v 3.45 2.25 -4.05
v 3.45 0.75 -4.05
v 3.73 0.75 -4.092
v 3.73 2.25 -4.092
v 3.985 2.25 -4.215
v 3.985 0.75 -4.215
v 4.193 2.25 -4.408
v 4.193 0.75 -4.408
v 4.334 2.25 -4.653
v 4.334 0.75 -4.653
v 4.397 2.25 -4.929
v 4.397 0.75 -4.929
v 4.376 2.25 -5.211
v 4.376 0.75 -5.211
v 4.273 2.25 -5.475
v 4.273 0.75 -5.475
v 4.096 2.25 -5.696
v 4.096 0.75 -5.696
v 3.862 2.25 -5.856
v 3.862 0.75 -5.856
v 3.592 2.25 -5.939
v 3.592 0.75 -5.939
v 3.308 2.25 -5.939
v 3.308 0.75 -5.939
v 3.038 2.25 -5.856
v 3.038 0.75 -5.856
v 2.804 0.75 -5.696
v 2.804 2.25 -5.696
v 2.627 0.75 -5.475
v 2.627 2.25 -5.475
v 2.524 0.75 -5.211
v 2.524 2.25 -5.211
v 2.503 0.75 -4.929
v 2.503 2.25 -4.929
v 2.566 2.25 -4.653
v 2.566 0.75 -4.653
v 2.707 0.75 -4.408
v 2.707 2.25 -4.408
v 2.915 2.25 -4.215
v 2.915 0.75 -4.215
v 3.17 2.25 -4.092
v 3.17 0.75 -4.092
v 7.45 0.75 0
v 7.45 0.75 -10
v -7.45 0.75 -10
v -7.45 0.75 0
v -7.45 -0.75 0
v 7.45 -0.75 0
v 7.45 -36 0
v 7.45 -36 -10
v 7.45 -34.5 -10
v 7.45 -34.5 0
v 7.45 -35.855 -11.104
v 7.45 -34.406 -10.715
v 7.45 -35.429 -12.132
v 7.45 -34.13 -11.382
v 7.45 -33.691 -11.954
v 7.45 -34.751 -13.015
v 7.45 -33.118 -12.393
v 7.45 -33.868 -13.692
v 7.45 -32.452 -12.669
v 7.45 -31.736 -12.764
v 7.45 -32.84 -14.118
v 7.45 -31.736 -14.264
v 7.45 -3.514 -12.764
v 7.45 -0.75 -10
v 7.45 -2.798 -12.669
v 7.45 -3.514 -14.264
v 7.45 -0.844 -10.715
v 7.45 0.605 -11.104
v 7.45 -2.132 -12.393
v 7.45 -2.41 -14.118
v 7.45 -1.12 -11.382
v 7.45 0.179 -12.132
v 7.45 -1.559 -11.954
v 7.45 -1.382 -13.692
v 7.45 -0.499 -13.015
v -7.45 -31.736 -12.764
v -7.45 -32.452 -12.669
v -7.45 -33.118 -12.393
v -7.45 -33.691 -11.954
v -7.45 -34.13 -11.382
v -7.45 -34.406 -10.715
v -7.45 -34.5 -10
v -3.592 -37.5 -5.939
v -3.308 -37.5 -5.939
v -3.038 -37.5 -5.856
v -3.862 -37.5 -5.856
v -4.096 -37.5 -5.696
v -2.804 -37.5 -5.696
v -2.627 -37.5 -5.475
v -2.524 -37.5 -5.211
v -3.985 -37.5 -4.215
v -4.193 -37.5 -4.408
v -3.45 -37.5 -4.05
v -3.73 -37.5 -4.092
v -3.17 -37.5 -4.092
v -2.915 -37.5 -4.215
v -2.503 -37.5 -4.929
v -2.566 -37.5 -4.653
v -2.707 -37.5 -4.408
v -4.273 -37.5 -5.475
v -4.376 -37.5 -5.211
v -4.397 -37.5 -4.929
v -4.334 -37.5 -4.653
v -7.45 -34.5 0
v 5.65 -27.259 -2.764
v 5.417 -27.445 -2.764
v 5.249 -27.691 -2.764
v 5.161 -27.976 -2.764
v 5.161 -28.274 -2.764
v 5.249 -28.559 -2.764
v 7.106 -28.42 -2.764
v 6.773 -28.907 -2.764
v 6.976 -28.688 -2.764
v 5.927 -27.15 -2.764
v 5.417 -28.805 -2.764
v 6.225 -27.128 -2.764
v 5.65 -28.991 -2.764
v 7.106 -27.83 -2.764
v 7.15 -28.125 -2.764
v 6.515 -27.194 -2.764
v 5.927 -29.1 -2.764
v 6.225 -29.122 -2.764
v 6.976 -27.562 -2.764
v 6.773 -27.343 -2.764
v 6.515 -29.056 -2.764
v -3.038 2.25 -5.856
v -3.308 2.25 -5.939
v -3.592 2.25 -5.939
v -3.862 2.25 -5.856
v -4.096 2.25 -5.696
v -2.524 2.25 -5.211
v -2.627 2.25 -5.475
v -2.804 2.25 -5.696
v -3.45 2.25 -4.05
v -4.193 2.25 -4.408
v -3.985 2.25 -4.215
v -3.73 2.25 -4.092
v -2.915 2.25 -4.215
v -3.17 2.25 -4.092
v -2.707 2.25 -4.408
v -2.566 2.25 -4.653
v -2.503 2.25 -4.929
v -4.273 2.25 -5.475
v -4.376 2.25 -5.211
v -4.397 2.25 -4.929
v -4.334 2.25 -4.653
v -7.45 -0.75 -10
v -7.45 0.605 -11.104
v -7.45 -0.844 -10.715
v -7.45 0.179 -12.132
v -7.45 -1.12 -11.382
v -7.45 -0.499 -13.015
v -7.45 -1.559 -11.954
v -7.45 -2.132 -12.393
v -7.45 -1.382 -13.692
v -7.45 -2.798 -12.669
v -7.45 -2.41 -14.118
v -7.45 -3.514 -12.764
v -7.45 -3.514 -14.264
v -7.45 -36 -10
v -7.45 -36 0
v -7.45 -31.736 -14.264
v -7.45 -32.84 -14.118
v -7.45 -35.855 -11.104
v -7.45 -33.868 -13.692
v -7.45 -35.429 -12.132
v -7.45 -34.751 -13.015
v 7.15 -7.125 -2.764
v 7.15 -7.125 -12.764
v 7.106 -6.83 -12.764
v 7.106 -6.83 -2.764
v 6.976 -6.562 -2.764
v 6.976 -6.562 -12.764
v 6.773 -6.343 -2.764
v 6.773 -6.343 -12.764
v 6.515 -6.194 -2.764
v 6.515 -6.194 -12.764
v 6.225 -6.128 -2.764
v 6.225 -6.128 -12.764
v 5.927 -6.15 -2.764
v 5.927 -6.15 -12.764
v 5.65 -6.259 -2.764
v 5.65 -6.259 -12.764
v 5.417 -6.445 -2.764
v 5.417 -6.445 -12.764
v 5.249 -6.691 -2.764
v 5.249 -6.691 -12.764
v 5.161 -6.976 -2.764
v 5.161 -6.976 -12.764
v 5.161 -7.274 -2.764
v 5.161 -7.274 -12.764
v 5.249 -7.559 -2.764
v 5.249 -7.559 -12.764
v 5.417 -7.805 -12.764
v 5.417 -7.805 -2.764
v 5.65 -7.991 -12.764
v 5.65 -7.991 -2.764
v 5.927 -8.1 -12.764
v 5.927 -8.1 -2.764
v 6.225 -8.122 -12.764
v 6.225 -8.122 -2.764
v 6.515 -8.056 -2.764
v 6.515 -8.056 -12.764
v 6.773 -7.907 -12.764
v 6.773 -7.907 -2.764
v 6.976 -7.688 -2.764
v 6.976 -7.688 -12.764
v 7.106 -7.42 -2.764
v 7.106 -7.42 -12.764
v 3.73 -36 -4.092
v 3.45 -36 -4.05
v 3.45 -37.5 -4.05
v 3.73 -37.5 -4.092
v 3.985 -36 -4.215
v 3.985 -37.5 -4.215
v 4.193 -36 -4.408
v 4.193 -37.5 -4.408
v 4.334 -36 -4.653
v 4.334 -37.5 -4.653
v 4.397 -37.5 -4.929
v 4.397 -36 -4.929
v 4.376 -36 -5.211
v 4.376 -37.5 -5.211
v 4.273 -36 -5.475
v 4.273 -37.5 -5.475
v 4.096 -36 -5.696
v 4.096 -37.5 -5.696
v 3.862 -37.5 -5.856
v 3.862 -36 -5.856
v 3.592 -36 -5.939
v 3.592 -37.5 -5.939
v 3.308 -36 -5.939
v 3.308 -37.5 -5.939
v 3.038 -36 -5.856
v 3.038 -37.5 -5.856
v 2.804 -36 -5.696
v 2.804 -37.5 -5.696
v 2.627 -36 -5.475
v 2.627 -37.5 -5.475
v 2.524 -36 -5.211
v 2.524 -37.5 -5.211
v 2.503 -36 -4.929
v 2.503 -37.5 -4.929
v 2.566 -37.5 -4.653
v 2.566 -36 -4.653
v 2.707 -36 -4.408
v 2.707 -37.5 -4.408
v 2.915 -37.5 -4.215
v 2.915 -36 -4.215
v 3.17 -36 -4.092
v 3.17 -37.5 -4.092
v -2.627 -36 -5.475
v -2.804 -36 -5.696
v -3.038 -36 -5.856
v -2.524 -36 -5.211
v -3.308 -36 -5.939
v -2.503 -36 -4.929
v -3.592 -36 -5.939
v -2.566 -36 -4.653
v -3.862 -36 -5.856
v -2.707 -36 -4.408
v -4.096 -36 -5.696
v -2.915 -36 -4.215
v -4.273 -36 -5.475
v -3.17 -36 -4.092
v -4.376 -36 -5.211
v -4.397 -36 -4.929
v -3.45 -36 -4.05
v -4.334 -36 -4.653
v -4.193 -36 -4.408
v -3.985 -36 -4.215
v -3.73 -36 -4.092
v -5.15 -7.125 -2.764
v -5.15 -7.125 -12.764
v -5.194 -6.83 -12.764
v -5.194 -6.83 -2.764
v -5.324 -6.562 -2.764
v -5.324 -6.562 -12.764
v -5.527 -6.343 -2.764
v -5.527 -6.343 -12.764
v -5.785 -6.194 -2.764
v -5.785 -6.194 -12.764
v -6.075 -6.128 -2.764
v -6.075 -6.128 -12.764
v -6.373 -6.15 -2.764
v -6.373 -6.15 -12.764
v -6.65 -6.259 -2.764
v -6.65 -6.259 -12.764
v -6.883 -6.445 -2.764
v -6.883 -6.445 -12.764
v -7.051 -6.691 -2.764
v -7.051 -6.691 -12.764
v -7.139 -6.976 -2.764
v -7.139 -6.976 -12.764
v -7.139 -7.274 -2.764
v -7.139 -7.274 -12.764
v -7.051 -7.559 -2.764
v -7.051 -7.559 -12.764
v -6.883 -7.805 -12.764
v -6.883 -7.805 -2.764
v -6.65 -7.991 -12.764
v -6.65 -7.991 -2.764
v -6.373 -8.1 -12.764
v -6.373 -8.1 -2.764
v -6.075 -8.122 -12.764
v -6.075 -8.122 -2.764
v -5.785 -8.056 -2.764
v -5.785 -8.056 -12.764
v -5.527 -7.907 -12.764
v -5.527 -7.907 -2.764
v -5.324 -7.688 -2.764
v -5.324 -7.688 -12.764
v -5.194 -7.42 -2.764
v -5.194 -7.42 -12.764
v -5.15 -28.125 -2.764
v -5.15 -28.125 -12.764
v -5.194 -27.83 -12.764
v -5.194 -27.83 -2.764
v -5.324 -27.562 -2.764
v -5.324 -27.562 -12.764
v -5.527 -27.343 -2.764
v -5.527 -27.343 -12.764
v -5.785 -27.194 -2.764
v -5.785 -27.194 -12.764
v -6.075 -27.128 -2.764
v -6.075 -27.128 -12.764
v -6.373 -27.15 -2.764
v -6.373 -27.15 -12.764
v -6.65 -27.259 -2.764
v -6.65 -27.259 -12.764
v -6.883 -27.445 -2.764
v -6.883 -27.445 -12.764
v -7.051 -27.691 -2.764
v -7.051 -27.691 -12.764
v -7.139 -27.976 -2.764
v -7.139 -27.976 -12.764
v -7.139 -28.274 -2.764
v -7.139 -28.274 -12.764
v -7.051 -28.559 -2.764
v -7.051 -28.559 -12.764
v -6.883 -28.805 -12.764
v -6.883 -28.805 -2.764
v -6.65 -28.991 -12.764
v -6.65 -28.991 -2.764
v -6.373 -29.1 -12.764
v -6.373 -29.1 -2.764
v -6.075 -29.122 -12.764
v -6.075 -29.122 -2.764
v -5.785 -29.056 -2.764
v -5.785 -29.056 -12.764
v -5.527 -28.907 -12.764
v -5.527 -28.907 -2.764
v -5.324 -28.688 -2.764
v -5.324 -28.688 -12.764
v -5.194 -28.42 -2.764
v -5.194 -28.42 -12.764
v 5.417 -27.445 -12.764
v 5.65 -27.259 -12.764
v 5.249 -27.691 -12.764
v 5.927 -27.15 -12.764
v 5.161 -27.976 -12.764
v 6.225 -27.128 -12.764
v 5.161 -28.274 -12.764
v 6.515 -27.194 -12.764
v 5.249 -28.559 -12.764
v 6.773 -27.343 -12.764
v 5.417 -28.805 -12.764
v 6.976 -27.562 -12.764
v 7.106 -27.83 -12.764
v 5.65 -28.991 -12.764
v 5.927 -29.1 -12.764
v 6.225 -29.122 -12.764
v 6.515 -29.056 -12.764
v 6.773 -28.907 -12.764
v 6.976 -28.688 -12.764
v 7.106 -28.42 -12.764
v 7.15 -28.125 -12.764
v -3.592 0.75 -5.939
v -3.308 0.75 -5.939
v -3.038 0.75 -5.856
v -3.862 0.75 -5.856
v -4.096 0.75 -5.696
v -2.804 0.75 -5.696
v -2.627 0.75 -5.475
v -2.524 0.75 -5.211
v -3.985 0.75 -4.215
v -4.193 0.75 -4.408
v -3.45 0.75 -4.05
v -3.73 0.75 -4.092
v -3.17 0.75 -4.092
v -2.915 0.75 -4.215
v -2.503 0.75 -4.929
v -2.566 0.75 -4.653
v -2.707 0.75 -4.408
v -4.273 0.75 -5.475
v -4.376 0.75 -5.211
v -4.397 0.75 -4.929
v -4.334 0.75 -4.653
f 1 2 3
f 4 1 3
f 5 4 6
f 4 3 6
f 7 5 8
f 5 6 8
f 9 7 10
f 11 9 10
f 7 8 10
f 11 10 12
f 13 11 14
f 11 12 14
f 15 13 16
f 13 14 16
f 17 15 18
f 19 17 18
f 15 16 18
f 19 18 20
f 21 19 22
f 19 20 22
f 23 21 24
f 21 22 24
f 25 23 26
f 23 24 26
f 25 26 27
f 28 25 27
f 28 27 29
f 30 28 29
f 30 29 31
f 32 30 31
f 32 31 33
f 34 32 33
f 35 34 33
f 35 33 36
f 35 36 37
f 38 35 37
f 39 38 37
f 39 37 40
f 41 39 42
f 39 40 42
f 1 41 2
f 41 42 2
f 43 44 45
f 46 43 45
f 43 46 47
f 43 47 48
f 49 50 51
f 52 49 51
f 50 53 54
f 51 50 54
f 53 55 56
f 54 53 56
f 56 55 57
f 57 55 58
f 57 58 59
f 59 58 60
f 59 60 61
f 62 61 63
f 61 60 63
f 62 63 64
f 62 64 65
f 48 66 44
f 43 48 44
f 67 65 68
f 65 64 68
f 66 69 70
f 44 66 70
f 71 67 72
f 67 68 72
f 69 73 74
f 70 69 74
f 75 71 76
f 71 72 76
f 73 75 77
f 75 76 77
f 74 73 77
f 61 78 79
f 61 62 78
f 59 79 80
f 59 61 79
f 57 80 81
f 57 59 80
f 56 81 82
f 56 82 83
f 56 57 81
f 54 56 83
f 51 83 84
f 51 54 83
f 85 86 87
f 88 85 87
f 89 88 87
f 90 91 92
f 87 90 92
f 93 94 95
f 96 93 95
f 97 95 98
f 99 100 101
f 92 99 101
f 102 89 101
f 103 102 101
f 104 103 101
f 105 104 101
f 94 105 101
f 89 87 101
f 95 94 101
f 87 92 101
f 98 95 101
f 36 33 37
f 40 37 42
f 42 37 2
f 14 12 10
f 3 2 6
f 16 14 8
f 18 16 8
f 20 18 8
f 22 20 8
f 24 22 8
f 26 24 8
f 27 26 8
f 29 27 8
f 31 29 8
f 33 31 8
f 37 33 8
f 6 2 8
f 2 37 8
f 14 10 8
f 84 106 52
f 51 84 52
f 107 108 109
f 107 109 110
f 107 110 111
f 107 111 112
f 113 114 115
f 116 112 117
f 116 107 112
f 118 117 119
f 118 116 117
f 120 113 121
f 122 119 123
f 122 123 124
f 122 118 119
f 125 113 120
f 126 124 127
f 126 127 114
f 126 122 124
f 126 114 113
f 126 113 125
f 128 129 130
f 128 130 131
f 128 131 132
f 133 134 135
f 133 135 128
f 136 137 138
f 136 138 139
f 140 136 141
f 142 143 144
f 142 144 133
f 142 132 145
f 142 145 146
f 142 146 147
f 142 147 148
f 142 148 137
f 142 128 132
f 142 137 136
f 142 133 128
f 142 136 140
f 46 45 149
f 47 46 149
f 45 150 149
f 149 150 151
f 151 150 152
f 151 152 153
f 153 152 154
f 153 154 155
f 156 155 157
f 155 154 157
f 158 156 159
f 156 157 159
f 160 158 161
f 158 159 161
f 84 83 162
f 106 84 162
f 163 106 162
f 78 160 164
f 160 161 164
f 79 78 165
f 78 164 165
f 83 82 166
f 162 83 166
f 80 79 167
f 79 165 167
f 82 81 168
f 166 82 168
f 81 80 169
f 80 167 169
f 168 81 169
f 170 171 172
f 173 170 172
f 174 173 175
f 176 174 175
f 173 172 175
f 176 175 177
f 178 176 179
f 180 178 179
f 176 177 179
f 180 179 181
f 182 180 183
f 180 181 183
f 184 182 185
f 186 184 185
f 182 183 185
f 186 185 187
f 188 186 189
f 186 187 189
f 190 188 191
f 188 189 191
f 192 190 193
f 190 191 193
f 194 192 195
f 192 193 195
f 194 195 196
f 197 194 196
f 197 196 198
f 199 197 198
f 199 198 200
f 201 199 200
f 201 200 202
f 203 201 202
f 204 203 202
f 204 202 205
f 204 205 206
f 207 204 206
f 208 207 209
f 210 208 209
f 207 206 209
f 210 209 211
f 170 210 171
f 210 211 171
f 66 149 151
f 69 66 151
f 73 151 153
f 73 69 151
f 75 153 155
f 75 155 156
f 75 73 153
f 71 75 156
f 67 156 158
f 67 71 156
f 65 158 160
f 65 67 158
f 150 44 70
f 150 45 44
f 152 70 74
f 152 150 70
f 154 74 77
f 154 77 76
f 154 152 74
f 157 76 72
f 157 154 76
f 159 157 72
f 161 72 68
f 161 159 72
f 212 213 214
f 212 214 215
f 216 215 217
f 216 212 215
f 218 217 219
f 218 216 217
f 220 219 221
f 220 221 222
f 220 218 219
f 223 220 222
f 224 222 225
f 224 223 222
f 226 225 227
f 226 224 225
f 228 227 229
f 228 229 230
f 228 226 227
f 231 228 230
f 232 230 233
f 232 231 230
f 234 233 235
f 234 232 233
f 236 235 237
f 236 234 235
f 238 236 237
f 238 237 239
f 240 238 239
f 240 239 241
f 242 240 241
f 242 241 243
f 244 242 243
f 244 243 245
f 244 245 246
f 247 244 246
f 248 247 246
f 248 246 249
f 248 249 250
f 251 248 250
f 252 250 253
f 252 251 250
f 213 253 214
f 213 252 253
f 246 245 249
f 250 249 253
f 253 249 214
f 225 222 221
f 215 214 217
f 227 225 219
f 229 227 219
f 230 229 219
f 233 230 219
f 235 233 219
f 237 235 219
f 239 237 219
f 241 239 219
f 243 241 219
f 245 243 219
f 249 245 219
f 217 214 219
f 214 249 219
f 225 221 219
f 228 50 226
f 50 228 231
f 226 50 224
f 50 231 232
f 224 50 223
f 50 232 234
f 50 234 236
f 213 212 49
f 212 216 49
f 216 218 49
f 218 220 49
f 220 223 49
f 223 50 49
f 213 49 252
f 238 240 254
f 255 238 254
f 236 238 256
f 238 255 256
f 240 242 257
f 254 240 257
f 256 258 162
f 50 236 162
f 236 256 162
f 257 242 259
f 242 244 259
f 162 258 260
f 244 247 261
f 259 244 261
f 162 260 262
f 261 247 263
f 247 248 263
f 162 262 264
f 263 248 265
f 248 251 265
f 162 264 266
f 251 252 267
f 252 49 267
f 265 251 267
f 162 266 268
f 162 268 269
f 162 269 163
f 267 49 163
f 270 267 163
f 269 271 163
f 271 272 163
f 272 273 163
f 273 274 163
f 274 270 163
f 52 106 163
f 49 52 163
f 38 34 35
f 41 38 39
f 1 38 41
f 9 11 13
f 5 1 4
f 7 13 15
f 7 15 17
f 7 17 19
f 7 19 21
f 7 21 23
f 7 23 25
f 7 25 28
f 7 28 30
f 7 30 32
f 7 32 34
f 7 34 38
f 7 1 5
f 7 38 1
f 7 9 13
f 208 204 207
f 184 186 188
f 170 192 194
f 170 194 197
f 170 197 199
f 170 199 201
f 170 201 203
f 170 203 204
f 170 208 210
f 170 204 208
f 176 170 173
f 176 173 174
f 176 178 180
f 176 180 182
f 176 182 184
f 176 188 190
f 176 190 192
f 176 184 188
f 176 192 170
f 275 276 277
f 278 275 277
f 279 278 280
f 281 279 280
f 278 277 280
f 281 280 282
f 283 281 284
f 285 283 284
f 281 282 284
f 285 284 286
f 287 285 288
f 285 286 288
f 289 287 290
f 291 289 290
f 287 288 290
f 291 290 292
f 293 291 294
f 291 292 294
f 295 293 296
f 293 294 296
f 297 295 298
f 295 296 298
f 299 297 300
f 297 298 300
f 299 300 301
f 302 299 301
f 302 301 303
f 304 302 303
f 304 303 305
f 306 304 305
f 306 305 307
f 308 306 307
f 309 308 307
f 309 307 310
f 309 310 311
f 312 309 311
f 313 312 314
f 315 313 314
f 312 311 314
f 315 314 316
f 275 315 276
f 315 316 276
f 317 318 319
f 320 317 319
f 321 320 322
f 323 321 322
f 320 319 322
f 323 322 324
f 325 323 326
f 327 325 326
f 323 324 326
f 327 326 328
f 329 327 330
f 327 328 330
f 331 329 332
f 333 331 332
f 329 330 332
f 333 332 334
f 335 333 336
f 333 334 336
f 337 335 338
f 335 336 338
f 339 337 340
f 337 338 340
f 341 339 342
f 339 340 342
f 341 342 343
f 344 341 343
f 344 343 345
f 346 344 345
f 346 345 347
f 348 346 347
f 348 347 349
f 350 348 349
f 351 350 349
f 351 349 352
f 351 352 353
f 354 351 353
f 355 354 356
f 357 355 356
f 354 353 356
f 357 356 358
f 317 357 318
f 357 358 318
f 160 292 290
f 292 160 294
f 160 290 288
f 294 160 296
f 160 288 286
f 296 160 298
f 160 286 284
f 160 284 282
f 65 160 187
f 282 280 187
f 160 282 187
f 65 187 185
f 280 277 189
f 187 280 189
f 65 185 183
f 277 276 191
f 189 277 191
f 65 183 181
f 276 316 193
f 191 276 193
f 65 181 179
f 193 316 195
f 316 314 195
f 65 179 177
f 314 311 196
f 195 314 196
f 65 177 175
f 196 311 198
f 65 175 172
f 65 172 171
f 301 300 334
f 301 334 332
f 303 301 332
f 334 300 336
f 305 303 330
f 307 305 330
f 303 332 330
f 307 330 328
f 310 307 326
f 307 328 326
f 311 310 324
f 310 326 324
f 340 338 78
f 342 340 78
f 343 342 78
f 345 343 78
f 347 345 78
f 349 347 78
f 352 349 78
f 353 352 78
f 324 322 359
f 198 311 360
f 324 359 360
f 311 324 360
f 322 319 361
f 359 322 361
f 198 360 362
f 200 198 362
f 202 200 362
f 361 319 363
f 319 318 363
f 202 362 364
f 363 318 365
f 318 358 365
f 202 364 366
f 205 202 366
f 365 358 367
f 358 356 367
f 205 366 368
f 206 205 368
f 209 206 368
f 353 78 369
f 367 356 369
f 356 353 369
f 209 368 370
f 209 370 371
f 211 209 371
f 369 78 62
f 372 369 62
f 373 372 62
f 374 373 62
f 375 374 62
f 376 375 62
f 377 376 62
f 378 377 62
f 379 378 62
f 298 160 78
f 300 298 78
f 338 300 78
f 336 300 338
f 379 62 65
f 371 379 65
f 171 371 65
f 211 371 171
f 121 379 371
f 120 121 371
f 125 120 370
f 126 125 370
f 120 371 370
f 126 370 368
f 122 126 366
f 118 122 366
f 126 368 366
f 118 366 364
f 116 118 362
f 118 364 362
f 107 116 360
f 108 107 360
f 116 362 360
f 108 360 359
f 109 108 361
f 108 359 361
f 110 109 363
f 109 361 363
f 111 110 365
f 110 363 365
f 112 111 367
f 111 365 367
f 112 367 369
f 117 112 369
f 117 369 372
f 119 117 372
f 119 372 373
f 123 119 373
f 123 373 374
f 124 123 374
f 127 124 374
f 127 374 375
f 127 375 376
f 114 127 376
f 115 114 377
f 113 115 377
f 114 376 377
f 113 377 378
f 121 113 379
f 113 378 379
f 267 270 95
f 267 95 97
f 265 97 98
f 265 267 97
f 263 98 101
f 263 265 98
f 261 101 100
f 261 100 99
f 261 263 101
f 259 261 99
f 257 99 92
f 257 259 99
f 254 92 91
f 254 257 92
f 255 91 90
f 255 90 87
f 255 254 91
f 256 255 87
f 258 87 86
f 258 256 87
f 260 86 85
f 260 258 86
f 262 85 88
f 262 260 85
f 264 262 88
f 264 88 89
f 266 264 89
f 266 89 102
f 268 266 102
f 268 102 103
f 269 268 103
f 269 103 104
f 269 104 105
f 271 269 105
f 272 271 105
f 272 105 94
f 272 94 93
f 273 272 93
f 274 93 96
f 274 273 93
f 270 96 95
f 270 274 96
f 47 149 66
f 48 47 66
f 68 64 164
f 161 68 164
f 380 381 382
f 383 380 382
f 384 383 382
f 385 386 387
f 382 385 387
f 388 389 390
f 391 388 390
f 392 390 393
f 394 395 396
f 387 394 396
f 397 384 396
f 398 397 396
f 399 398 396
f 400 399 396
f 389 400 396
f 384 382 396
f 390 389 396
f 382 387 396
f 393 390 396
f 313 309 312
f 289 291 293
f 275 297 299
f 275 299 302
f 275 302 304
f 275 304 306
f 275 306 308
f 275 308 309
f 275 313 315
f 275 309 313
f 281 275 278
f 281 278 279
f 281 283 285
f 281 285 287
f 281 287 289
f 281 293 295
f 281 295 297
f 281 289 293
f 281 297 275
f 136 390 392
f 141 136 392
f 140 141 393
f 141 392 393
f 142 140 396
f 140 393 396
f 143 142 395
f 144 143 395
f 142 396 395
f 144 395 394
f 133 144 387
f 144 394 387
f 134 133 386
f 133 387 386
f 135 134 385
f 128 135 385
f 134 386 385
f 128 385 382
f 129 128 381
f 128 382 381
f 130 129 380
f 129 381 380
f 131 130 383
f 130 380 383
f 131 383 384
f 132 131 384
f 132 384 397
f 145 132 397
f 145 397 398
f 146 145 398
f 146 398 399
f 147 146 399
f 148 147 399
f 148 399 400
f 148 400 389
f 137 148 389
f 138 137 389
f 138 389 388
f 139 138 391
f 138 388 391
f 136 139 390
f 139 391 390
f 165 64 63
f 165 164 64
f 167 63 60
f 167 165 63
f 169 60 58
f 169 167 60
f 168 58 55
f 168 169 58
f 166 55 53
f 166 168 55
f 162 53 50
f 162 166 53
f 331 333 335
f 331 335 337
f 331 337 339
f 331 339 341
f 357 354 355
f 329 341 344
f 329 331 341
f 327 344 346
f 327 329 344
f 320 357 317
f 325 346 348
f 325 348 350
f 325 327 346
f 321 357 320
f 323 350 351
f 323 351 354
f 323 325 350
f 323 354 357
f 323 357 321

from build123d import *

# Parameters (mm, degrees)
SKETCH_1_W        = 14.9
SKETCH_1_H        = 1.5
EXTRUDE_START     = 0.75
SKETCH_8_R        = 0.95
EXTRUDE_1_DEPTH   = 1.5
EXTRUDE_1_2_DEPTH = 1.5
EXTRUDE_START_2   = -1.5
SKETCH_10_R       = 0.95
EXTRUDE_2_DEPTH   = 1.5
SKETCH_12_R       = 1
EXTRUDE_3_DEPTH   = 10


with BuildPart() as part:
    # 扫描5: sweep along a path in 草图6
    with BuildLine(Plane(origin=(0, 0, 0), x_dir=(0, 0, -1), z_dir=(1, 0, 0))) as sweep_5_path:
        Line((0, 0), (10, 0))
        ThreePointArc((10, 0), (12.484512752, -1.029118878), (13.51363163, -3.51363163))
        Line((13.51363163, -3.51363163), (13.51363163, -31.73636837))
        ThreePointArc((13.51363163, -31.73636837), (12.484512752, -34.220881122), (10, -35.25))
        Line((10, -35.25), (0, -35.25))
    # 草图1 → 扫描5 (sweep)
    with BuildSketch(Plane.XY):
        Rectangle(SKETCH_1_W, SKETCH_1_H)
    sweep(path=sweep_5_path.line)

    # 草图10 → 凸台-拉伸2 (add)
    with BuildSketch(Plane(origin=(0, -34.5, 0), x_dir=(1, 0, 0), z_dir=(0, 1, 0)).offset(EXTRUDE_START_2)):
        with Locations(Location((-3.45, 5, 0), (0, 0, 270))):  # turned: the seam where the file's is
            Circle(SKETCH_10_R)
        with Locations(Location((3.45, 5, 0), (0, 0, 270))):  # turned: the seam where the file's is
            Circle(SKETCH_10_R)
    extrude(amount=-EXTRUDE_2_DEPTH)

    # 草图12 → 凸台-拉伸3 (add)
    with BuildSketch(Plane.XY.offset(-12.76363163)):
        with Locations((-6.15, -28.125)):
            Circle(SKETCH_12_R)
        with Locations((-6.15, -7.125)):
            Circle(SKETCH_12_R)
        with Locations((6.15, -7.125)):
            Circle(SKETCH_12_R)
        with Locations((6.15, -28.125)):
            Circle(SKETCH_12_R)
    extrude(amount=EXTRUDE_3_DEPTH)


with BuildPart() as body_2:
    # 草图8 → 凸台-拉伸1 (new body)
    with BuildSketch(Plane(origin=(0, 0, 0), x_dir=(1, 0, 0), z_dir=(0, 1, 0)).offset(EXTRUDE_START)):
        with Locations(Location((-3.45, 5, 0), (0, 0, 270))):  # turned: the seam where the file's is
            Circle(SKETCH_8_R)
    extrude(amount=EXTRUDE_1_DEPTH)


with BuildPart() as body_3:
    # 草图8 → Extrude 1 2 (new body)
    with BuildSketch(Plane(origin=(0, 0, 0), x_dir=(1, 0, 0), z_dir=(0, 1, 0)).offset(EXTRUDE_START)):
        with Locations(Location((3.45, 5, 0), (0, 0, 270))):  # turned: the seam where the file's is
            Circle(SKETCH_8_R)
    extrude(amount=EXTRUDE_1_2_DEPTH)


solid = Compound([part.part, body_2.part, body_3.part])
